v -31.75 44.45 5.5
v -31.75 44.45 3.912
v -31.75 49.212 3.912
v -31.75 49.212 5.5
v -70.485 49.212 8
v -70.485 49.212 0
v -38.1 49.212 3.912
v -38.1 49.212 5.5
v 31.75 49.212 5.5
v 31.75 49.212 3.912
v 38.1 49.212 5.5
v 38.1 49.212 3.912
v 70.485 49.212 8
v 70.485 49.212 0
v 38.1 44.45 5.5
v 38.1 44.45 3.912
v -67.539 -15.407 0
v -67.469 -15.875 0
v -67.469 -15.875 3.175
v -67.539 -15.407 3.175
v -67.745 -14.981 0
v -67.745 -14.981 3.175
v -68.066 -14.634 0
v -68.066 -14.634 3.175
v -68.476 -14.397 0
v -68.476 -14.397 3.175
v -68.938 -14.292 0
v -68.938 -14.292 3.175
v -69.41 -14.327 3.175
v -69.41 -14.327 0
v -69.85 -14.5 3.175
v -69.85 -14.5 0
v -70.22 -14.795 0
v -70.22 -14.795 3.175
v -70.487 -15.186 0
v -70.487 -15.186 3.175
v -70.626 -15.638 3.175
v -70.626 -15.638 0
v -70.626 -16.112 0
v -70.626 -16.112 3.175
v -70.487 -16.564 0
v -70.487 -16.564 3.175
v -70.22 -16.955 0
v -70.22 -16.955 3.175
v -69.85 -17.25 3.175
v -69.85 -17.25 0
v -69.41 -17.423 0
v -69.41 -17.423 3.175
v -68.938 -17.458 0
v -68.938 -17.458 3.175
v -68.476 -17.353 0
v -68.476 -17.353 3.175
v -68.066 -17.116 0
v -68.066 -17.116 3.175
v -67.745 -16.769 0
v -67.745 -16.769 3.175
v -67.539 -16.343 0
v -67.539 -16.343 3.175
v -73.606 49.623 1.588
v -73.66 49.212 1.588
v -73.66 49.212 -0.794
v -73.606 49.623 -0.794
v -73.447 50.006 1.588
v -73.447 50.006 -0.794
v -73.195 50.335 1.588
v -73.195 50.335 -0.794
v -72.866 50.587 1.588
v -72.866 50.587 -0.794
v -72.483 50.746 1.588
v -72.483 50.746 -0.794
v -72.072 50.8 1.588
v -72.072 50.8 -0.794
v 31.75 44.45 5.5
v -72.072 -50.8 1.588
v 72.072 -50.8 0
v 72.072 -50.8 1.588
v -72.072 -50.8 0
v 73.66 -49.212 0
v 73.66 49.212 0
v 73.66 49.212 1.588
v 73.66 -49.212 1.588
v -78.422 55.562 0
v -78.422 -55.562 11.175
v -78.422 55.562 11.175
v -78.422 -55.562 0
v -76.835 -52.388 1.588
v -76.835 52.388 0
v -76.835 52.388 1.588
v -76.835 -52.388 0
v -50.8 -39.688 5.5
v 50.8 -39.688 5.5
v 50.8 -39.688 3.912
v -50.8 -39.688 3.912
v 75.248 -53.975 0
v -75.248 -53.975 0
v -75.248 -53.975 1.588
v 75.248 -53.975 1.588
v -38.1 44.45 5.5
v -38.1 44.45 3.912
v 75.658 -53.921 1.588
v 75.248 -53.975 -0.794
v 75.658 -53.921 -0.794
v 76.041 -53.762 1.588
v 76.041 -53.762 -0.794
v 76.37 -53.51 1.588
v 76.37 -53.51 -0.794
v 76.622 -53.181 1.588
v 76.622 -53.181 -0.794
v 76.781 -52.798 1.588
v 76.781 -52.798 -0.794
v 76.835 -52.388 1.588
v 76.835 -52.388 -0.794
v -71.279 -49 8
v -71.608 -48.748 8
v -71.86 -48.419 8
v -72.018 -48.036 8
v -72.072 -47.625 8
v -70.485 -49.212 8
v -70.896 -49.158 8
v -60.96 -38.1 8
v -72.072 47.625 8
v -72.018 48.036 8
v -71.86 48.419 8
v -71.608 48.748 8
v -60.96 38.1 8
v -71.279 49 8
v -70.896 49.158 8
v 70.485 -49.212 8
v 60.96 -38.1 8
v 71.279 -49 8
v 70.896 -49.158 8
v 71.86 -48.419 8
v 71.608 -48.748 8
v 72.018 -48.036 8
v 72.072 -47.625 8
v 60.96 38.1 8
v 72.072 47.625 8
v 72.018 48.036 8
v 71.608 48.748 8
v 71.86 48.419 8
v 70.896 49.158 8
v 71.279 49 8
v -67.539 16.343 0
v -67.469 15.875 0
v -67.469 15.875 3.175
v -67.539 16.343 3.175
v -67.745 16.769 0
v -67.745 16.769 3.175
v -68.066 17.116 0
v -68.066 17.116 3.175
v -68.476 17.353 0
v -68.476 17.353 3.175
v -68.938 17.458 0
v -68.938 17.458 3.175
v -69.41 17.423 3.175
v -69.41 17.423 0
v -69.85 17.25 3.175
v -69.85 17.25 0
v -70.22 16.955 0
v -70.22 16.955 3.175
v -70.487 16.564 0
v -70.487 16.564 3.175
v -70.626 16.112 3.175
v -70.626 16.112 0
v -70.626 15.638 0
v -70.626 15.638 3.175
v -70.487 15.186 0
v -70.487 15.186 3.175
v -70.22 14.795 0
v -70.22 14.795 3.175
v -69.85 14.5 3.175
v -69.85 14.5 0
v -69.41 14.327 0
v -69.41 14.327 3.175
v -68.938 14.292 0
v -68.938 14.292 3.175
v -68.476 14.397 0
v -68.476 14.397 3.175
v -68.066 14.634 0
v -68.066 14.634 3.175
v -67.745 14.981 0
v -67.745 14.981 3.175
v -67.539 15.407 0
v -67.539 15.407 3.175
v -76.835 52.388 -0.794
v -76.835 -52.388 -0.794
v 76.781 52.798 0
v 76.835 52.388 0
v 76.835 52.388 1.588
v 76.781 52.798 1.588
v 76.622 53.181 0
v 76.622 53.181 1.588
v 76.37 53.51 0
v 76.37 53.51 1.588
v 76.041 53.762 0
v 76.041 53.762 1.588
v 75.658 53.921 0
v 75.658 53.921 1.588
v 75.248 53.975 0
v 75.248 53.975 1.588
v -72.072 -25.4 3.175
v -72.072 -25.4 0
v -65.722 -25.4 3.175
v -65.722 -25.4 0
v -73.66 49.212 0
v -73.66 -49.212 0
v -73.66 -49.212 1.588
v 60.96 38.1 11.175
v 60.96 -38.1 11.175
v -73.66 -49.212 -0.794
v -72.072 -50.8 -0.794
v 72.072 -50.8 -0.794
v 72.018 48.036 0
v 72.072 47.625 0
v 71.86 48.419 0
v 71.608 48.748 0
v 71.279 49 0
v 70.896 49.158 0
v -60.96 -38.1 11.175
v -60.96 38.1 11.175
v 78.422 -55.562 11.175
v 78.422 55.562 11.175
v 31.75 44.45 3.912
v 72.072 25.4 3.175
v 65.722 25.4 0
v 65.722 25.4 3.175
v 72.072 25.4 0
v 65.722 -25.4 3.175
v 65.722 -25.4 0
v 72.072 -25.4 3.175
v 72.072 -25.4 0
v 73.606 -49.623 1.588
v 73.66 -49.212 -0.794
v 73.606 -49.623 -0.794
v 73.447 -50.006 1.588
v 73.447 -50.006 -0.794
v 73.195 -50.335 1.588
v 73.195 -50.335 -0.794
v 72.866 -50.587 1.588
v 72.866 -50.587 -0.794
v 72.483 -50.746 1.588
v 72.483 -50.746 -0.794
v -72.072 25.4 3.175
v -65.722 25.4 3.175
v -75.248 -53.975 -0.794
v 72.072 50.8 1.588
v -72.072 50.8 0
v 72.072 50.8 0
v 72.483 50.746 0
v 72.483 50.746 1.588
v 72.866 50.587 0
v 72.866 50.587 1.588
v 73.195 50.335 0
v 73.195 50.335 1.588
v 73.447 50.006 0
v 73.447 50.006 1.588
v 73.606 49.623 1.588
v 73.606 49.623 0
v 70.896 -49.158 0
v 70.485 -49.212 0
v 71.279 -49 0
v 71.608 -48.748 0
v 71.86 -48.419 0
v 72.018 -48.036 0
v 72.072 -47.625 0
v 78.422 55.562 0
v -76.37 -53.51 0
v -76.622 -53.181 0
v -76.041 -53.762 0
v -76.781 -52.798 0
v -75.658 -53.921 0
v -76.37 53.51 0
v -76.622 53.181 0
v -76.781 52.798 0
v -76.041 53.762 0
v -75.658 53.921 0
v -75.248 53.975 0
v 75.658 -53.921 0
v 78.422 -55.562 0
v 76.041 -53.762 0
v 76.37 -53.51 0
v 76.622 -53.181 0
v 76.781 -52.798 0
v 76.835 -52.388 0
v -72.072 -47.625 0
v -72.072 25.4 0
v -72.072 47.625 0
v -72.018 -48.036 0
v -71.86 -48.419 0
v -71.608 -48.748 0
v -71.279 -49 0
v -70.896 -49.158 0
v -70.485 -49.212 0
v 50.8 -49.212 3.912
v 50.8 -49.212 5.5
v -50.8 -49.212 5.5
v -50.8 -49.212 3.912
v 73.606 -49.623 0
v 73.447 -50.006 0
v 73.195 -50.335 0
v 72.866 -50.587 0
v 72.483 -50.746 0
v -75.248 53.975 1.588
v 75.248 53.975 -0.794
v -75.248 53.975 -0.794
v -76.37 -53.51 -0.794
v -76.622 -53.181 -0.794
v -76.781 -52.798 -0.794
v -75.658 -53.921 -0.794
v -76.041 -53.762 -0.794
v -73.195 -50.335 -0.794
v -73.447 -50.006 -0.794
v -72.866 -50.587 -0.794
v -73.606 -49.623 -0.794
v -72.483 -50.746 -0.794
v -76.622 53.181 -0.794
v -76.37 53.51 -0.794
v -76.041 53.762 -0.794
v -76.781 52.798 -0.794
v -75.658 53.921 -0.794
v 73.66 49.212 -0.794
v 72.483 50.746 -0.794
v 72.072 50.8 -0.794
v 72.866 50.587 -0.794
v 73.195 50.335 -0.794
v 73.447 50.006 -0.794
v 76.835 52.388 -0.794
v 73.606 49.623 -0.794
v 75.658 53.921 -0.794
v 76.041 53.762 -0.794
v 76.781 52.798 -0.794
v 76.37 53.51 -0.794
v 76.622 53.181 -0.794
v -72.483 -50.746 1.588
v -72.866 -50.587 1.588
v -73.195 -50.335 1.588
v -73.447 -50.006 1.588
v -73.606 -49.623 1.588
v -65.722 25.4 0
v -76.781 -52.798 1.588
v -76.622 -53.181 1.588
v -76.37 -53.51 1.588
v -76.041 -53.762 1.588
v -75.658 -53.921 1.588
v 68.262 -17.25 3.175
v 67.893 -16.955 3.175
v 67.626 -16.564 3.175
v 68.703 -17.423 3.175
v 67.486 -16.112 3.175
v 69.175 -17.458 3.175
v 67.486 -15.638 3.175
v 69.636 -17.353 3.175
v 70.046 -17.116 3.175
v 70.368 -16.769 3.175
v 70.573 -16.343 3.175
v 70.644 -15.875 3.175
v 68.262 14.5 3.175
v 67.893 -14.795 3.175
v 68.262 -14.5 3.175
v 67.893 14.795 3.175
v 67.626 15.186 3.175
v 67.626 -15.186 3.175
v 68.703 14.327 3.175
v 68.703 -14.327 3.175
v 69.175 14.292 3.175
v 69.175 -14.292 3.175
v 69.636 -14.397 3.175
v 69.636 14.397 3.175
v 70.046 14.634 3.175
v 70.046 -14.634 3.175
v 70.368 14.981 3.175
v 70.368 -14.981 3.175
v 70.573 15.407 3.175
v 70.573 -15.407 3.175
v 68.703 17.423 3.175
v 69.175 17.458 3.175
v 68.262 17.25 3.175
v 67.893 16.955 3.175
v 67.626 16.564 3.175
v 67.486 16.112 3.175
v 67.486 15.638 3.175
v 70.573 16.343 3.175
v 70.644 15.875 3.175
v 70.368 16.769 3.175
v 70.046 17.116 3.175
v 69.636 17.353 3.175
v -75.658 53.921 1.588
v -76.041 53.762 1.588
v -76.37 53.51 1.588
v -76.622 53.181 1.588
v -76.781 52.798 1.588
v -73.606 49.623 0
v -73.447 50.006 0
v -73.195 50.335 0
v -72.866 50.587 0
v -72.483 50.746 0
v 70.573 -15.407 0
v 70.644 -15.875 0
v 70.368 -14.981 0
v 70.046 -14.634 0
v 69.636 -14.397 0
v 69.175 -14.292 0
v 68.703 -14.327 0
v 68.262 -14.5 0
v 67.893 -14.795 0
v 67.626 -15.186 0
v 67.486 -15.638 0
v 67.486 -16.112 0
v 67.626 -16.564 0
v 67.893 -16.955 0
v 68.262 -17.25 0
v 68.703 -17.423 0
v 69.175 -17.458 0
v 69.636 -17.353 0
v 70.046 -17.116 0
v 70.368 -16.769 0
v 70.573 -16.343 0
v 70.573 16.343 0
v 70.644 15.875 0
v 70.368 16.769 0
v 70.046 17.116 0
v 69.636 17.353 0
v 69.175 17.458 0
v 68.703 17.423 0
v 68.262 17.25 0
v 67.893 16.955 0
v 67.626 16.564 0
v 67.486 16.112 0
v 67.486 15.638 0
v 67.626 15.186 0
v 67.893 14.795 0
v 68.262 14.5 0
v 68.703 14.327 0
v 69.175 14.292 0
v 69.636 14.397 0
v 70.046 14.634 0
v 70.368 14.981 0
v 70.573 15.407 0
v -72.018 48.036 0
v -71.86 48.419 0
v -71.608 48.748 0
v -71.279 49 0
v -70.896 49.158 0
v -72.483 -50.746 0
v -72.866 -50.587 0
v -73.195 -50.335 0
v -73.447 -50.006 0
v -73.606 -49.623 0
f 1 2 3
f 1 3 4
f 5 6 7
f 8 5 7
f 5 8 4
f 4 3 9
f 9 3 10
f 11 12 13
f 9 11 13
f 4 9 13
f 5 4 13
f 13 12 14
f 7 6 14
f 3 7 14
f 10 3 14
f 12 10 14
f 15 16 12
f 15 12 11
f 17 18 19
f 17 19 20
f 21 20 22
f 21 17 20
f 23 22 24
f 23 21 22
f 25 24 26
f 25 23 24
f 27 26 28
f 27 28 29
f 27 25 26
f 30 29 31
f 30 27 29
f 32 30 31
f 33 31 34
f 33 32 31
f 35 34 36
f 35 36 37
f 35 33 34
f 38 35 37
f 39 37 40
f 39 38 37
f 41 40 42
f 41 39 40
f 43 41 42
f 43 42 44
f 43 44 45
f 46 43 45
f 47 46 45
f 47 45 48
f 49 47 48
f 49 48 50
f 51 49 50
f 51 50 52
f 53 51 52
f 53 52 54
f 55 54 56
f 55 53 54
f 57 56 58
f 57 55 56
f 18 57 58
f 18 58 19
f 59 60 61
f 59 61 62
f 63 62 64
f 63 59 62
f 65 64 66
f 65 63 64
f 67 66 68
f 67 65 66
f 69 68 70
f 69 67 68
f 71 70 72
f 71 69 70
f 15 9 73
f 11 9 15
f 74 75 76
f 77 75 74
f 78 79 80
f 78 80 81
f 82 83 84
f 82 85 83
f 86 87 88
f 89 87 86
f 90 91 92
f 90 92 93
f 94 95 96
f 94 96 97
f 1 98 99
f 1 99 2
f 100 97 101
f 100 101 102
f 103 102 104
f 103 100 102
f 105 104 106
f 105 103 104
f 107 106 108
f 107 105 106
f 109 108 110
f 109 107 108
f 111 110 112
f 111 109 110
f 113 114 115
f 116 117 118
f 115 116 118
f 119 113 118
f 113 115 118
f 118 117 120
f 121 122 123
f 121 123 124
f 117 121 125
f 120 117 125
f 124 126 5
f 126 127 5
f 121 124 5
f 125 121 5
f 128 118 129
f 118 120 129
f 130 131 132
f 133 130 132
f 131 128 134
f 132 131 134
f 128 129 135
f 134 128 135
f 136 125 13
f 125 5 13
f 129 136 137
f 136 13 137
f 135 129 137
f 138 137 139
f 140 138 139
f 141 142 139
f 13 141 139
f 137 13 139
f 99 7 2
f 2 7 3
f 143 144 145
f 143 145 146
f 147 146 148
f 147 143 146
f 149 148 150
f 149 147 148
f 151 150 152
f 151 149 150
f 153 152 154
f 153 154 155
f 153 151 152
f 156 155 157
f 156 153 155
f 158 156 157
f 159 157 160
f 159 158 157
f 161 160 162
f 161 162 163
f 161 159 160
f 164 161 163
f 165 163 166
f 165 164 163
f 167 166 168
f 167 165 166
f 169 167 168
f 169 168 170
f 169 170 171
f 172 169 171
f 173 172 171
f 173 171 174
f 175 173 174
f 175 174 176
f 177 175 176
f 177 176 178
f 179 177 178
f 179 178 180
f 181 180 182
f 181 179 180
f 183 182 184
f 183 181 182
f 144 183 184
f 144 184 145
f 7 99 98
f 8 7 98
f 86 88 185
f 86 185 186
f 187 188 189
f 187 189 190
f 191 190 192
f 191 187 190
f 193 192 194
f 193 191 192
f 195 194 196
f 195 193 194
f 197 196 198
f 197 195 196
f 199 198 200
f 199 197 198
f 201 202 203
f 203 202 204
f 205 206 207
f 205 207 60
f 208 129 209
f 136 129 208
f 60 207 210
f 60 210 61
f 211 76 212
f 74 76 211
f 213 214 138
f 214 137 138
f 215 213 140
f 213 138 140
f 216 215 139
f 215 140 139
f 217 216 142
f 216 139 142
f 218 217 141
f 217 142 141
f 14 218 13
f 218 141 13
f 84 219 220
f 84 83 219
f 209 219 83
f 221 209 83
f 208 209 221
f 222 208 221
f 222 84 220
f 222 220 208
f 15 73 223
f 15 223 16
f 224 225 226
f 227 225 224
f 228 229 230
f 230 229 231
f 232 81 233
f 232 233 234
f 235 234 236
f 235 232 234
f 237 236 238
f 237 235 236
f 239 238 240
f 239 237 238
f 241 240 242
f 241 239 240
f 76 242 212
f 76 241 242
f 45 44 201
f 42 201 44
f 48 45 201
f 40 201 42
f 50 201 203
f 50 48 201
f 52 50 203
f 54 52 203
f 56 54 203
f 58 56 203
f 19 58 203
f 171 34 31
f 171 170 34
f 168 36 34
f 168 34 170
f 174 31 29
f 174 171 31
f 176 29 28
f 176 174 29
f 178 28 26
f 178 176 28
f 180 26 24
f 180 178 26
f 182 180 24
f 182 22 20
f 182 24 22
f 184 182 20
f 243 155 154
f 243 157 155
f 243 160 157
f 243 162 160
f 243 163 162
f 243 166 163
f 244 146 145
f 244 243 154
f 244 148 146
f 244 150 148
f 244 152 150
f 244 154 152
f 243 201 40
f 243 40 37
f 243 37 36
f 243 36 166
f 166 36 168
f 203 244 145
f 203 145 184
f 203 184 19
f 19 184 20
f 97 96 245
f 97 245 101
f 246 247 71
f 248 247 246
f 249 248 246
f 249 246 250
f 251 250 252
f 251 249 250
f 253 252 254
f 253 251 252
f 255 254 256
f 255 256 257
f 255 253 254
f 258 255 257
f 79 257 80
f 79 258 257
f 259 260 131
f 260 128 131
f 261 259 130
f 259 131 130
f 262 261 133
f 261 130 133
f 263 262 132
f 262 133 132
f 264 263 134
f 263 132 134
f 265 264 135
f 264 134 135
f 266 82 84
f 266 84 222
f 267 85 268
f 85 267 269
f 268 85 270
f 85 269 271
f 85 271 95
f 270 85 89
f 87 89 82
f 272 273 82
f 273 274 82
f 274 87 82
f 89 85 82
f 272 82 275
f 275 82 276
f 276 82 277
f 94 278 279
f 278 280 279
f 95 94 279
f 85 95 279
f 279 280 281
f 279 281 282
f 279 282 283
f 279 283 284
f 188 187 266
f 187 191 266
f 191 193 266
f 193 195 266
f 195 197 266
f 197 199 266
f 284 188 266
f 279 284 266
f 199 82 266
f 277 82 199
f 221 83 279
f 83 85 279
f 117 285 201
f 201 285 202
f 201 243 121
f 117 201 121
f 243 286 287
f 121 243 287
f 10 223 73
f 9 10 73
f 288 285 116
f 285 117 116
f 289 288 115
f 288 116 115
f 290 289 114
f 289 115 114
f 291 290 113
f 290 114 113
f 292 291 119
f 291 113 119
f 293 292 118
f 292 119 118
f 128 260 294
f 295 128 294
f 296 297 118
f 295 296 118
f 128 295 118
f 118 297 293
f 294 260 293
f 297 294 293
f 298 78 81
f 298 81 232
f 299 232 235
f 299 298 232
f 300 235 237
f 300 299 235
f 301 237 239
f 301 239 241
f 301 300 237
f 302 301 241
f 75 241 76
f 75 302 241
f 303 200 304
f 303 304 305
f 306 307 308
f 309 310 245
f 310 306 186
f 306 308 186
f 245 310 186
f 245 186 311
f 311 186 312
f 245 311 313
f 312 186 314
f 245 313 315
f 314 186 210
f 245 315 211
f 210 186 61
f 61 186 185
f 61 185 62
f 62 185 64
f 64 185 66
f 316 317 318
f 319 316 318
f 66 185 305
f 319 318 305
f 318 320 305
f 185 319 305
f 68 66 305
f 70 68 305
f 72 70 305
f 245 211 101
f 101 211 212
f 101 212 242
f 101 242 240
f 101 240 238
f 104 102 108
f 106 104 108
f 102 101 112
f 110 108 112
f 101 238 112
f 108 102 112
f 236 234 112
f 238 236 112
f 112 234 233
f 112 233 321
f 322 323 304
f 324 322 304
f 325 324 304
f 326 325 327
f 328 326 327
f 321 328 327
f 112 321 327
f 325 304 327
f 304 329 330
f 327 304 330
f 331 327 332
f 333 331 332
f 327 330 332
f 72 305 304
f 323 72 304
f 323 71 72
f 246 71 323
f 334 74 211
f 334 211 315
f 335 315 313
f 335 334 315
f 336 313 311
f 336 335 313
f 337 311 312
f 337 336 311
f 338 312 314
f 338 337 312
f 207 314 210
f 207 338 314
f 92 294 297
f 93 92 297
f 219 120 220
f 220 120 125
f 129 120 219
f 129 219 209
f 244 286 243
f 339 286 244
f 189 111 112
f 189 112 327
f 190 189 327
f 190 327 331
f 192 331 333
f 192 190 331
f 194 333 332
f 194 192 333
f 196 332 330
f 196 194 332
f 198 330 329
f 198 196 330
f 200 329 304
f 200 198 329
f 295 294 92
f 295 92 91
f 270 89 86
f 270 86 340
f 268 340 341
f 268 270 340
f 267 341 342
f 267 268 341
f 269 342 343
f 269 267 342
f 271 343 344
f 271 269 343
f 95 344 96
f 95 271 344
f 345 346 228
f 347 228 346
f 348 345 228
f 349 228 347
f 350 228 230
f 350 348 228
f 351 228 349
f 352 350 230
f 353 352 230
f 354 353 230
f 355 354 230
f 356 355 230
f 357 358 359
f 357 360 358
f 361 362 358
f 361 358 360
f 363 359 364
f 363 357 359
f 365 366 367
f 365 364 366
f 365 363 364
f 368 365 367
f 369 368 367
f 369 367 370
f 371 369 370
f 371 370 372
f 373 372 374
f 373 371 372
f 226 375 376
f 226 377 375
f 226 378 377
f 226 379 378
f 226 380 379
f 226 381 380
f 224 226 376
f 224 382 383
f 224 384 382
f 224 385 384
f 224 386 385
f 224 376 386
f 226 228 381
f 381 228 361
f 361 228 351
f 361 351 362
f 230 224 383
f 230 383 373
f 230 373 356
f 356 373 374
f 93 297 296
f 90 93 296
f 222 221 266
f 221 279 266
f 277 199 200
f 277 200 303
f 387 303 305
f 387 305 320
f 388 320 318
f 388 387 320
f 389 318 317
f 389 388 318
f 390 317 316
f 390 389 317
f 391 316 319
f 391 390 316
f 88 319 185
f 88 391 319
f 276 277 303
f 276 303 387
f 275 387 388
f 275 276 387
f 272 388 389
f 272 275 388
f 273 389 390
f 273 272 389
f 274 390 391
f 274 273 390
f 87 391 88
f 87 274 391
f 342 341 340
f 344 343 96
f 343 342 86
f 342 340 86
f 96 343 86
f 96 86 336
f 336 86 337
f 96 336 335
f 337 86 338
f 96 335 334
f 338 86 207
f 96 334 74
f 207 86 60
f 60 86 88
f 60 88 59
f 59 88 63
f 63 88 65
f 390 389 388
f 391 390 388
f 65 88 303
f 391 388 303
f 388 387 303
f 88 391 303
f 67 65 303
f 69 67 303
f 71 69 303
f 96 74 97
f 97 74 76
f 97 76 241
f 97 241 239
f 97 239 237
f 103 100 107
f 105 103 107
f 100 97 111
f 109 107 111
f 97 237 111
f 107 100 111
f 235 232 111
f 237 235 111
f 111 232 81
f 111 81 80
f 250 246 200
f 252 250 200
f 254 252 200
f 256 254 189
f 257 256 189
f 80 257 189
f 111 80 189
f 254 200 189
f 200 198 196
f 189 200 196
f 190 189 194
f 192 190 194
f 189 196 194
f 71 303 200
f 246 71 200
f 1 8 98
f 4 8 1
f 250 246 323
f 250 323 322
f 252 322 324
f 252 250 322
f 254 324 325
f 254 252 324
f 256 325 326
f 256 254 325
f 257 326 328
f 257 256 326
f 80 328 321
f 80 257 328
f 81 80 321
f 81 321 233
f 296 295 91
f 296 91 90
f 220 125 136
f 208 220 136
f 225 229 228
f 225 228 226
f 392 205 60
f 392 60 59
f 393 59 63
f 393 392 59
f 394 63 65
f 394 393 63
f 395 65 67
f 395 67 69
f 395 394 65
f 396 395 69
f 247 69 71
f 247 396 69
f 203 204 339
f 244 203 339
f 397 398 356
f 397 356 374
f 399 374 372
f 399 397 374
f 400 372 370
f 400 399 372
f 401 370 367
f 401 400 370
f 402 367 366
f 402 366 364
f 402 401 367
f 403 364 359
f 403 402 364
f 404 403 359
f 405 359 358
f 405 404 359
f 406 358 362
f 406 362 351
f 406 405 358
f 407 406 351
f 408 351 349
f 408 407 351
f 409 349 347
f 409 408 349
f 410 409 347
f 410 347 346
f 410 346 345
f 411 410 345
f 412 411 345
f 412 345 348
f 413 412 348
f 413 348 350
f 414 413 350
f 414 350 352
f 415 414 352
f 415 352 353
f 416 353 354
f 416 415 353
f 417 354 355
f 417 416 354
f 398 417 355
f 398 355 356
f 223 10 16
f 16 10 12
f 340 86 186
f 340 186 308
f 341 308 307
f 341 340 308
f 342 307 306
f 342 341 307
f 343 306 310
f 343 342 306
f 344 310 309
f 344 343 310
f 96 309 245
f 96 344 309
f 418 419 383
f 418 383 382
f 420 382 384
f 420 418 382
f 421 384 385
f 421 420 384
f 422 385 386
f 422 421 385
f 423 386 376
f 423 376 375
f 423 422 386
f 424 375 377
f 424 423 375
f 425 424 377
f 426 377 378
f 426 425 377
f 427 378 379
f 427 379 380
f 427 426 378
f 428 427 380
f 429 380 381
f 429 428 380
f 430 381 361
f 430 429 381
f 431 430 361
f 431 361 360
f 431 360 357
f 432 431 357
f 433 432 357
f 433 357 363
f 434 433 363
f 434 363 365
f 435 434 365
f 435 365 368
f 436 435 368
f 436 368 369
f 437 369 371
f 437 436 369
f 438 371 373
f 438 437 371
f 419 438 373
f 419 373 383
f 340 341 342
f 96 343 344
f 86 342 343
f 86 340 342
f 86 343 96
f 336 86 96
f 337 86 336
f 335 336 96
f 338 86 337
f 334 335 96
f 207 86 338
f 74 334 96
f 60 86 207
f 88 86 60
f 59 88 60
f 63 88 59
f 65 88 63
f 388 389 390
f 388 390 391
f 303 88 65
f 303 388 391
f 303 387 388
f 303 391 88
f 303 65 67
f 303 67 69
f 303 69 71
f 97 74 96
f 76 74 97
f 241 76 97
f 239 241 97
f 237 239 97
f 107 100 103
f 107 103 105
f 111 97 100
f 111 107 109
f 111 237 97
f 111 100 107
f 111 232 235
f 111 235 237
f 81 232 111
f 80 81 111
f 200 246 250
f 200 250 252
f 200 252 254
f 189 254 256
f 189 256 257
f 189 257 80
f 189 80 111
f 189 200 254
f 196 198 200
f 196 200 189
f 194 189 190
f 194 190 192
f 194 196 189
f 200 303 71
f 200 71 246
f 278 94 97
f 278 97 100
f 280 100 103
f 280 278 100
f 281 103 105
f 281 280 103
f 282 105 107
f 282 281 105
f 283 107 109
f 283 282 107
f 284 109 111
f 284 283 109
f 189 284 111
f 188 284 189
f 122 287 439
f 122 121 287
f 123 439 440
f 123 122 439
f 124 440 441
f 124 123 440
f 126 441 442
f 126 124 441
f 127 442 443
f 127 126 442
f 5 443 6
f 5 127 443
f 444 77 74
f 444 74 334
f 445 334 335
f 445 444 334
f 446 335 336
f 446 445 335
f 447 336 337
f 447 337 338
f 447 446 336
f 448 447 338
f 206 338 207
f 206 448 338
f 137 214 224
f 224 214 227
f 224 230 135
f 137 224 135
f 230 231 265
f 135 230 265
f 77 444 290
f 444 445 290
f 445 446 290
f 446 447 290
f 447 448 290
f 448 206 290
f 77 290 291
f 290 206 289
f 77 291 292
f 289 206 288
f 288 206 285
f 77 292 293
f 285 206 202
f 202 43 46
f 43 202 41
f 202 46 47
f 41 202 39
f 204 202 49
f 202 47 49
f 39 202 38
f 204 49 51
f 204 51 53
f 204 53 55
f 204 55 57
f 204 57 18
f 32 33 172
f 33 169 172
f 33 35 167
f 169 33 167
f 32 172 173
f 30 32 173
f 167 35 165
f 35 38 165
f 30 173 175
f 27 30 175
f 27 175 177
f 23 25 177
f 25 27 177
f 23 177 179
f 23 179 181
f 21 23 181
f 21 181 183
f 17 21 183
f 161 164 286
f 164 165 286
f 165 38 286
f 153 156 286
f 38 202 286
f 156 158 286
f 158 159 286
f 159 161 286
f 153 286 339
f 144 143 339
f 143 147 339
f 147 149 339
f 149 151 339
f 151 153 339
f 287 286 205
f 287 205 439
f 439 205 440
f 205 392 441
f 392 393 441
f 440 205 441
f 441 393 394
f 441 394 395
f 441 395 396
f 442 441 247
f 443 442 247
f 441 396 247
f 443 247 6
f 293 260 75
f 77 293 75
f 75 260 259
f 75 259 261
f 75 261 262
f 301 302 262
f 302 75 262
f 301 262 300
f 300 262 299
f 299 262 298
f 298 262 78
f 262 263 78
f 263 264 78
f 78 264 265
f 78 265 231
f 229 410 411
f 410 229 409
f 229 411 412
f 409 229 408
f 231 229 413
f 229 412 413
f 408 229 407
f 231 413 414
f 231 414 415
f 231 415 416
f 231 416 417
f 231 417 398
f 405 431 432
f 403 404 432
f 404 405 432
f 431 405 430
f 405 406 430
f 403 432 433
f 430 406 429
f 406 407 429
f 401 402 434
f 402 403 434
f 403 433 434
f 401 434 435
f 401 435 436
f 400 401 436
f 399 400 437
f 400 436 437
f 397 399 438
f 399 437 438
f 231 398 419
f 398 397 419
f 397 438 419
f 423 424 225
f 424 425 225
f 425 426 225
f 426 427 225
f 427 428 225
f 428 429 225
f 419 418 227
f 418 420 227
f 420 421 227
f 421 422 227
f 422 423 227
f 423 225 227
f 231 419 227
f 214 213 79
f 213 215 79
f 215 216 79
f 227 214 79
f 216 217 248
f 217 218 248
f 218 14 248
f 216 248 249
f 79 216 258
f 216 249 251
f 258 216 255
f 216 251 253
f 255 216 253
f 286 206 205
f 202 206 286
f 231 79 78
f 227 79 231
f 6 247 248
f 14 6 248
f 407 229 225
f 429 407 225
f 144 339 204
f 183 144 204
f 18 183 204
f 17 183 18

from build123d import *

# Parameters (mm, degrees)
F0_W      = 156.845
F0_H      = 111.125
F0_W_2    = 1.5875
F0_H_2    = 50.8
F1_DEPTH  = 8
F0_W_3    = 6.35
F0_R      = 1.5875
F2_DEPTH  = 3.175
F3_W      = 156.845
F3_H      = 111.125
F3_W_2    = 144.145
F3_H_2    = 98.425
F3_W_3    = 121.92
F3_H_3    = 76.2
F4_DEPTH  = 3.175
F5_R      = 1.5875
F6_W      = 101.6
F6_H      = 1.5875
F7_DEPTH  = 9.525
F8_W      = 6.35
F8_H      = 1.5875
F9_DEPTH  = 4.7625
F10_DEPTH = 1.5875
F11_DEPTH = 2.38125


with BuildPart() as f1:
    # F0 (on Top) → F1 (new body)
    with BuildSketch(Plane.XY):
        Rectangle(F0_W, F0_H)
        with BuildLine():
            Line((75.2475, -53.975), (-75.2475, -53.975))
            ThreePointArc((-75.2475, -53.975), (-76.3700320151, -53.5100320151), (-76.835, -52.3875))
            Line((-76.835, -52.3875), (-76.835, 52.3875))
            ThreePointArc((-76.835, 52.3875), (-76.3700320151, 53.5100320151), (-75.2475, 53.975))
            Line((-75.2475, 53.975), (75.2475, 53.975))
            ThreePointArc((75.2475, 53.975), (76.3700320151, 53.5100320151), (76.835, 52.3875))
            Line((76.835, 52.3875), (76.835, -52.3875))
            ThreePointArc((76.835, -52.3875), (76.3700320151, -53.5100320151), (75.2475, -53.975))
        make_face(mode=Mode.SUBTRACT)
        with BuildLine():
            ThreePointArc((-76.835, -52.3875), (-76.3700320151, -53.5100320151), (-75.2475, -53.975))
            Line((-75.2475, -53.975), (75.2475, -53.975))
            ThreePointArc((75.2475, -53.975), (76.3700320151, -53.5100320151), (76.835, -52.3875))
            Line((76.835, -52.3875), (76.835, 52.3875))
            ThreePointArc((76.835, 52.3875), (76.3700320151, 53.5100320151), (75.2475, 53.975))
            Line((75.2475, 53.975), (-75.2475, 53.975))
            ThreePointArc((-75.2475, 53.975), (-76.3700320151, 53.5100320151), (-76.835, 52.3875))
            Line((-76.835, 52.3875), (-76.835, -52.3875))
        make_face()
        with BuildLine():
            ThreePointArc((-73.66, 49.2125), (-73.1950320151, 50.3350320151), (-72.0725, 50.8))
            Line((-72.0725, 50.8), (72.0725, 50.8))
            ThreePointArc((72.0725, 50.8), (73.1950320151, 50.3350320151), (73.66, 49.2125))
            Line((73.66, 49.2125), (73.66, 25.4))
            Line((73.66, 25.4), (73.66, -25.4))
            Line((73.66, -25.4), (73.66, -49.2125))
            ThreePointArc((73.66, -49.2125), (73.1950320151, -50.3350320151), (72.0725, -50.8))
            Line((72.0725, -50.8), (-72.0725, -50.8))
            ThreePointArc((-72.0725, -50.8), (-73.1950320151, -50.3350320151), (-73.66, -49.2125))
            Line((-73.66, -49.2125), (-73.66, -25.4))
            Line((-73.66, -25.4), (-73.66, 25.4))
            Line((-73.66, 25.4), (-73.66, 49.2125))
        make_face(mode=Mode.SUBTRACT)
        with BuildLine():
            Line((-72.0725, -25.4), (-73.66, -25.4))
            Line((-73.66, -25.4), (-73.66, -49.2125))
            ThreePointArc((-73.66, -49.2125), (-73.1950320151, -50.3350320151), (-72.0725, -50.8))
            Line((-72.0725, -50.8), (72.0725, -50.8))
            ThreePointArc((72.0725, -50.8), (73.1950320151, -50.3350320151), (73.66, -49.2125))
            Line((73.66, -49.2125), (73.66, -25.4))
            Line((73.66, -25.4), (72.0725, -25.4))
            Line((72.0725, -25.4), (72.0725, -49.2125))
            Line((72.0725, -49.2125), (-72.0725, -49.2125))
            Line((-72.0725, -49.2125), (-72.0725, -25.4))
        make_face()
        with BuildLine():
            Line((72.0725, 50.8), (-72.0725, 50.8))
            ThreePointArc((-72.0725, 50.8), (-73.1950320151, 50.3350320151), (-73.66, 49.2125))
            Line((-73.66, 49.2125), (-73.66, 25.4))
            Line((-73.66, 25.4), (-72.0725, 25.4))
            Line((-72.0725, 25.4), (-72.0725, 49.2125))
            Line((-72.0725, 49.2125), (72.0725, 49.2125))
            Line((72.0725, 49.2125), (72.0725, 25.4))
            Line((72.0725, 25.4), (73.66, 25.4))
            Line((73.66, 25.4), (73.66, 49.2125))
            ThreePointArc((73.66, 49.2125), (73.1950320151, 50.3350320151), (72.0725, 50.8))
        make_face()
        with Locations((-72.86625, 0)):
            Rectangle(F0_W_2, F0_H_2)
        with Locations((72.86625, 0)):
            Rectangle(F0_W_2, F0_H_2)
    extrude(amount=F1_DEPTH)

    # F0 (on Top) → F2 (join)
    with BuildSketch(Plane.XY):
        with Locations((68.8975, 0)):
            Rectangle(F0_W_3, F0_H_2)
        with Locations((69.05625, -15.875)):
            Circle(F0_R, mode=Mode.SUBTRACT)
        with Locations((69.05625, 15.875)):
            Circle(F0_R, mode=Mode.SUBTRACT)
        with Locations((-68.8975, 0)):
            Rectangle(F0_W_3, F0_H_2)
        with Locations((-69.05625, -15.875)):
            Circle(F0_R, mode=Mode.SUBTRACT)
        with Locations((-69.05625, 15.875)):
            Circle(F0_R, mode=Mode.SUBTRACT)
    extrude(amount=F2_DEPTH)

    # F3 (on face) → F4 (join)
    with BuildSketch(Plane.XY.offset(8)):
        Rectangle(F3_W, F3_H)
        Rectangle(F3_W_2, F3_H_2, mode=Mode.SUBTRACT)
        Rectangle(F3_W_2, F3_H_2)
        Rectangle(F3_W_3, F3_H_3, mode=Mode.SUBTRACT)
    extrude(amount=F4_DEPTH)

    # F5
    f5_edges = [f1.edges().sort_by_distance(p)[0] for p in [
        (-72.0725, -49.2125, 4),
        (-72.0725, 49.2125, 4),
        (72.0725, -49.2125, 4),
        (72.0725, 49.2125, 4),
    ]]
    fillet(f5_edges, radius=F5_R)

    # F6 (on face) → F7 (join)
    with BuildSketch(Plane(origin=(0, -49.2125, 0), x_dir=(-1, 0, 0), z_dir=(0, 1, 0))):
        with Locations((0, 4.70625)):
            Rectangle(F6_W, F6_H)
    extrude(amount=F7_DEPTH)

    # F8 (on face) → F9 (join)
    with BuildSketch(Plane.XZ.offset(-49.2125)):
        with Locations((-34.925, 4.70625)):
            Rectangle(F8_W, F8_H)
        with Locations((34.925, 4.70625)):
            Rectangle(F8_W, F8_H)
    extrude(amount=F9_DEPTH)

    # F0 (on Top) → F10 (cut)
    with BuildSketch(Plane.XY):
        with BuildLine():
            ThreePointArc((-76.835, -52.3875), (-76.3700320151, -53.5100320151), (-75.2475, -53.975))
            Line((-75.2475, -53.975), (75.2475, -53.975))
            ThreePointArc((75.2475, -53.975), (76.3700320151, -53.5100320151), (76.835, -52.3875))
            Line((76.835, -52.3875), (76.835, 52.3875))
            ThreePointArc((76.835, 52.3875), (76.3700320151, 53.5100320151), (75.2475, 53.975))
            Line((75.2475, 53.975), (-75.2475, 53.975))
            ThreePointArc((-75.2475, 53.975), (-76.3700320151, 53.5100320151), (-76.835, 52.3875))
            Line((-76.835, 52.3875), (-76.835, -52.3875))
        make_face()
        with BuildLine():
            ThreePointArc((-73.66, 49.2125), (-73.1950320151, 50.3350320151), (-72.0725, 50.8))
            Line((-72.0725, 50.8), (72.0725, 50.8))
            ThreePointArc((72.0725, 50.8), (73.1950320151, 50.3350320151), (73.66, 49.2125))
            Line((73.66, 49.2125), (73.66, 25.4))
            Line((73.66, 25.4), (73.66, -25.4))
            Line((73.66, -25.4), (73.66, -49.2125))
            ThreePointArc((73.66, -49.2125), (73.1950320151, -50.3350320151), (72.0725, -50.8))
            Line((72.0725, -50.8), (-72.0725, -50.8))
            ThreePointArc((-72.0725, -50.8), (-73.1950320151, -50.3350320151), (-73.66, -49.2125))
            Line((-73.66, -49.2125), (-73.66, -25.4))
            Line((-73.66, -25.4), (-73.66, 25.4))
            Line((-73.66, 25.4), (-73.66, 49.2125))
        make_face(mode=Mode.SUBTRACT)
    extrude(amount=F10_DEPTH, mode=Mode.SUBTRACT)


with BuildPart() as f11:
    # F11 (new): a face of the model
    f11_faces = [f1.part.faces().sort_by_distance(p)[0] for p in [
        (-75.0421074804, 52.1821074804, 1.5875),
    ]]
    extrude(f11_faces, amount=F11_DEPTH)


solid = Compound([f1.part, f11.part])
